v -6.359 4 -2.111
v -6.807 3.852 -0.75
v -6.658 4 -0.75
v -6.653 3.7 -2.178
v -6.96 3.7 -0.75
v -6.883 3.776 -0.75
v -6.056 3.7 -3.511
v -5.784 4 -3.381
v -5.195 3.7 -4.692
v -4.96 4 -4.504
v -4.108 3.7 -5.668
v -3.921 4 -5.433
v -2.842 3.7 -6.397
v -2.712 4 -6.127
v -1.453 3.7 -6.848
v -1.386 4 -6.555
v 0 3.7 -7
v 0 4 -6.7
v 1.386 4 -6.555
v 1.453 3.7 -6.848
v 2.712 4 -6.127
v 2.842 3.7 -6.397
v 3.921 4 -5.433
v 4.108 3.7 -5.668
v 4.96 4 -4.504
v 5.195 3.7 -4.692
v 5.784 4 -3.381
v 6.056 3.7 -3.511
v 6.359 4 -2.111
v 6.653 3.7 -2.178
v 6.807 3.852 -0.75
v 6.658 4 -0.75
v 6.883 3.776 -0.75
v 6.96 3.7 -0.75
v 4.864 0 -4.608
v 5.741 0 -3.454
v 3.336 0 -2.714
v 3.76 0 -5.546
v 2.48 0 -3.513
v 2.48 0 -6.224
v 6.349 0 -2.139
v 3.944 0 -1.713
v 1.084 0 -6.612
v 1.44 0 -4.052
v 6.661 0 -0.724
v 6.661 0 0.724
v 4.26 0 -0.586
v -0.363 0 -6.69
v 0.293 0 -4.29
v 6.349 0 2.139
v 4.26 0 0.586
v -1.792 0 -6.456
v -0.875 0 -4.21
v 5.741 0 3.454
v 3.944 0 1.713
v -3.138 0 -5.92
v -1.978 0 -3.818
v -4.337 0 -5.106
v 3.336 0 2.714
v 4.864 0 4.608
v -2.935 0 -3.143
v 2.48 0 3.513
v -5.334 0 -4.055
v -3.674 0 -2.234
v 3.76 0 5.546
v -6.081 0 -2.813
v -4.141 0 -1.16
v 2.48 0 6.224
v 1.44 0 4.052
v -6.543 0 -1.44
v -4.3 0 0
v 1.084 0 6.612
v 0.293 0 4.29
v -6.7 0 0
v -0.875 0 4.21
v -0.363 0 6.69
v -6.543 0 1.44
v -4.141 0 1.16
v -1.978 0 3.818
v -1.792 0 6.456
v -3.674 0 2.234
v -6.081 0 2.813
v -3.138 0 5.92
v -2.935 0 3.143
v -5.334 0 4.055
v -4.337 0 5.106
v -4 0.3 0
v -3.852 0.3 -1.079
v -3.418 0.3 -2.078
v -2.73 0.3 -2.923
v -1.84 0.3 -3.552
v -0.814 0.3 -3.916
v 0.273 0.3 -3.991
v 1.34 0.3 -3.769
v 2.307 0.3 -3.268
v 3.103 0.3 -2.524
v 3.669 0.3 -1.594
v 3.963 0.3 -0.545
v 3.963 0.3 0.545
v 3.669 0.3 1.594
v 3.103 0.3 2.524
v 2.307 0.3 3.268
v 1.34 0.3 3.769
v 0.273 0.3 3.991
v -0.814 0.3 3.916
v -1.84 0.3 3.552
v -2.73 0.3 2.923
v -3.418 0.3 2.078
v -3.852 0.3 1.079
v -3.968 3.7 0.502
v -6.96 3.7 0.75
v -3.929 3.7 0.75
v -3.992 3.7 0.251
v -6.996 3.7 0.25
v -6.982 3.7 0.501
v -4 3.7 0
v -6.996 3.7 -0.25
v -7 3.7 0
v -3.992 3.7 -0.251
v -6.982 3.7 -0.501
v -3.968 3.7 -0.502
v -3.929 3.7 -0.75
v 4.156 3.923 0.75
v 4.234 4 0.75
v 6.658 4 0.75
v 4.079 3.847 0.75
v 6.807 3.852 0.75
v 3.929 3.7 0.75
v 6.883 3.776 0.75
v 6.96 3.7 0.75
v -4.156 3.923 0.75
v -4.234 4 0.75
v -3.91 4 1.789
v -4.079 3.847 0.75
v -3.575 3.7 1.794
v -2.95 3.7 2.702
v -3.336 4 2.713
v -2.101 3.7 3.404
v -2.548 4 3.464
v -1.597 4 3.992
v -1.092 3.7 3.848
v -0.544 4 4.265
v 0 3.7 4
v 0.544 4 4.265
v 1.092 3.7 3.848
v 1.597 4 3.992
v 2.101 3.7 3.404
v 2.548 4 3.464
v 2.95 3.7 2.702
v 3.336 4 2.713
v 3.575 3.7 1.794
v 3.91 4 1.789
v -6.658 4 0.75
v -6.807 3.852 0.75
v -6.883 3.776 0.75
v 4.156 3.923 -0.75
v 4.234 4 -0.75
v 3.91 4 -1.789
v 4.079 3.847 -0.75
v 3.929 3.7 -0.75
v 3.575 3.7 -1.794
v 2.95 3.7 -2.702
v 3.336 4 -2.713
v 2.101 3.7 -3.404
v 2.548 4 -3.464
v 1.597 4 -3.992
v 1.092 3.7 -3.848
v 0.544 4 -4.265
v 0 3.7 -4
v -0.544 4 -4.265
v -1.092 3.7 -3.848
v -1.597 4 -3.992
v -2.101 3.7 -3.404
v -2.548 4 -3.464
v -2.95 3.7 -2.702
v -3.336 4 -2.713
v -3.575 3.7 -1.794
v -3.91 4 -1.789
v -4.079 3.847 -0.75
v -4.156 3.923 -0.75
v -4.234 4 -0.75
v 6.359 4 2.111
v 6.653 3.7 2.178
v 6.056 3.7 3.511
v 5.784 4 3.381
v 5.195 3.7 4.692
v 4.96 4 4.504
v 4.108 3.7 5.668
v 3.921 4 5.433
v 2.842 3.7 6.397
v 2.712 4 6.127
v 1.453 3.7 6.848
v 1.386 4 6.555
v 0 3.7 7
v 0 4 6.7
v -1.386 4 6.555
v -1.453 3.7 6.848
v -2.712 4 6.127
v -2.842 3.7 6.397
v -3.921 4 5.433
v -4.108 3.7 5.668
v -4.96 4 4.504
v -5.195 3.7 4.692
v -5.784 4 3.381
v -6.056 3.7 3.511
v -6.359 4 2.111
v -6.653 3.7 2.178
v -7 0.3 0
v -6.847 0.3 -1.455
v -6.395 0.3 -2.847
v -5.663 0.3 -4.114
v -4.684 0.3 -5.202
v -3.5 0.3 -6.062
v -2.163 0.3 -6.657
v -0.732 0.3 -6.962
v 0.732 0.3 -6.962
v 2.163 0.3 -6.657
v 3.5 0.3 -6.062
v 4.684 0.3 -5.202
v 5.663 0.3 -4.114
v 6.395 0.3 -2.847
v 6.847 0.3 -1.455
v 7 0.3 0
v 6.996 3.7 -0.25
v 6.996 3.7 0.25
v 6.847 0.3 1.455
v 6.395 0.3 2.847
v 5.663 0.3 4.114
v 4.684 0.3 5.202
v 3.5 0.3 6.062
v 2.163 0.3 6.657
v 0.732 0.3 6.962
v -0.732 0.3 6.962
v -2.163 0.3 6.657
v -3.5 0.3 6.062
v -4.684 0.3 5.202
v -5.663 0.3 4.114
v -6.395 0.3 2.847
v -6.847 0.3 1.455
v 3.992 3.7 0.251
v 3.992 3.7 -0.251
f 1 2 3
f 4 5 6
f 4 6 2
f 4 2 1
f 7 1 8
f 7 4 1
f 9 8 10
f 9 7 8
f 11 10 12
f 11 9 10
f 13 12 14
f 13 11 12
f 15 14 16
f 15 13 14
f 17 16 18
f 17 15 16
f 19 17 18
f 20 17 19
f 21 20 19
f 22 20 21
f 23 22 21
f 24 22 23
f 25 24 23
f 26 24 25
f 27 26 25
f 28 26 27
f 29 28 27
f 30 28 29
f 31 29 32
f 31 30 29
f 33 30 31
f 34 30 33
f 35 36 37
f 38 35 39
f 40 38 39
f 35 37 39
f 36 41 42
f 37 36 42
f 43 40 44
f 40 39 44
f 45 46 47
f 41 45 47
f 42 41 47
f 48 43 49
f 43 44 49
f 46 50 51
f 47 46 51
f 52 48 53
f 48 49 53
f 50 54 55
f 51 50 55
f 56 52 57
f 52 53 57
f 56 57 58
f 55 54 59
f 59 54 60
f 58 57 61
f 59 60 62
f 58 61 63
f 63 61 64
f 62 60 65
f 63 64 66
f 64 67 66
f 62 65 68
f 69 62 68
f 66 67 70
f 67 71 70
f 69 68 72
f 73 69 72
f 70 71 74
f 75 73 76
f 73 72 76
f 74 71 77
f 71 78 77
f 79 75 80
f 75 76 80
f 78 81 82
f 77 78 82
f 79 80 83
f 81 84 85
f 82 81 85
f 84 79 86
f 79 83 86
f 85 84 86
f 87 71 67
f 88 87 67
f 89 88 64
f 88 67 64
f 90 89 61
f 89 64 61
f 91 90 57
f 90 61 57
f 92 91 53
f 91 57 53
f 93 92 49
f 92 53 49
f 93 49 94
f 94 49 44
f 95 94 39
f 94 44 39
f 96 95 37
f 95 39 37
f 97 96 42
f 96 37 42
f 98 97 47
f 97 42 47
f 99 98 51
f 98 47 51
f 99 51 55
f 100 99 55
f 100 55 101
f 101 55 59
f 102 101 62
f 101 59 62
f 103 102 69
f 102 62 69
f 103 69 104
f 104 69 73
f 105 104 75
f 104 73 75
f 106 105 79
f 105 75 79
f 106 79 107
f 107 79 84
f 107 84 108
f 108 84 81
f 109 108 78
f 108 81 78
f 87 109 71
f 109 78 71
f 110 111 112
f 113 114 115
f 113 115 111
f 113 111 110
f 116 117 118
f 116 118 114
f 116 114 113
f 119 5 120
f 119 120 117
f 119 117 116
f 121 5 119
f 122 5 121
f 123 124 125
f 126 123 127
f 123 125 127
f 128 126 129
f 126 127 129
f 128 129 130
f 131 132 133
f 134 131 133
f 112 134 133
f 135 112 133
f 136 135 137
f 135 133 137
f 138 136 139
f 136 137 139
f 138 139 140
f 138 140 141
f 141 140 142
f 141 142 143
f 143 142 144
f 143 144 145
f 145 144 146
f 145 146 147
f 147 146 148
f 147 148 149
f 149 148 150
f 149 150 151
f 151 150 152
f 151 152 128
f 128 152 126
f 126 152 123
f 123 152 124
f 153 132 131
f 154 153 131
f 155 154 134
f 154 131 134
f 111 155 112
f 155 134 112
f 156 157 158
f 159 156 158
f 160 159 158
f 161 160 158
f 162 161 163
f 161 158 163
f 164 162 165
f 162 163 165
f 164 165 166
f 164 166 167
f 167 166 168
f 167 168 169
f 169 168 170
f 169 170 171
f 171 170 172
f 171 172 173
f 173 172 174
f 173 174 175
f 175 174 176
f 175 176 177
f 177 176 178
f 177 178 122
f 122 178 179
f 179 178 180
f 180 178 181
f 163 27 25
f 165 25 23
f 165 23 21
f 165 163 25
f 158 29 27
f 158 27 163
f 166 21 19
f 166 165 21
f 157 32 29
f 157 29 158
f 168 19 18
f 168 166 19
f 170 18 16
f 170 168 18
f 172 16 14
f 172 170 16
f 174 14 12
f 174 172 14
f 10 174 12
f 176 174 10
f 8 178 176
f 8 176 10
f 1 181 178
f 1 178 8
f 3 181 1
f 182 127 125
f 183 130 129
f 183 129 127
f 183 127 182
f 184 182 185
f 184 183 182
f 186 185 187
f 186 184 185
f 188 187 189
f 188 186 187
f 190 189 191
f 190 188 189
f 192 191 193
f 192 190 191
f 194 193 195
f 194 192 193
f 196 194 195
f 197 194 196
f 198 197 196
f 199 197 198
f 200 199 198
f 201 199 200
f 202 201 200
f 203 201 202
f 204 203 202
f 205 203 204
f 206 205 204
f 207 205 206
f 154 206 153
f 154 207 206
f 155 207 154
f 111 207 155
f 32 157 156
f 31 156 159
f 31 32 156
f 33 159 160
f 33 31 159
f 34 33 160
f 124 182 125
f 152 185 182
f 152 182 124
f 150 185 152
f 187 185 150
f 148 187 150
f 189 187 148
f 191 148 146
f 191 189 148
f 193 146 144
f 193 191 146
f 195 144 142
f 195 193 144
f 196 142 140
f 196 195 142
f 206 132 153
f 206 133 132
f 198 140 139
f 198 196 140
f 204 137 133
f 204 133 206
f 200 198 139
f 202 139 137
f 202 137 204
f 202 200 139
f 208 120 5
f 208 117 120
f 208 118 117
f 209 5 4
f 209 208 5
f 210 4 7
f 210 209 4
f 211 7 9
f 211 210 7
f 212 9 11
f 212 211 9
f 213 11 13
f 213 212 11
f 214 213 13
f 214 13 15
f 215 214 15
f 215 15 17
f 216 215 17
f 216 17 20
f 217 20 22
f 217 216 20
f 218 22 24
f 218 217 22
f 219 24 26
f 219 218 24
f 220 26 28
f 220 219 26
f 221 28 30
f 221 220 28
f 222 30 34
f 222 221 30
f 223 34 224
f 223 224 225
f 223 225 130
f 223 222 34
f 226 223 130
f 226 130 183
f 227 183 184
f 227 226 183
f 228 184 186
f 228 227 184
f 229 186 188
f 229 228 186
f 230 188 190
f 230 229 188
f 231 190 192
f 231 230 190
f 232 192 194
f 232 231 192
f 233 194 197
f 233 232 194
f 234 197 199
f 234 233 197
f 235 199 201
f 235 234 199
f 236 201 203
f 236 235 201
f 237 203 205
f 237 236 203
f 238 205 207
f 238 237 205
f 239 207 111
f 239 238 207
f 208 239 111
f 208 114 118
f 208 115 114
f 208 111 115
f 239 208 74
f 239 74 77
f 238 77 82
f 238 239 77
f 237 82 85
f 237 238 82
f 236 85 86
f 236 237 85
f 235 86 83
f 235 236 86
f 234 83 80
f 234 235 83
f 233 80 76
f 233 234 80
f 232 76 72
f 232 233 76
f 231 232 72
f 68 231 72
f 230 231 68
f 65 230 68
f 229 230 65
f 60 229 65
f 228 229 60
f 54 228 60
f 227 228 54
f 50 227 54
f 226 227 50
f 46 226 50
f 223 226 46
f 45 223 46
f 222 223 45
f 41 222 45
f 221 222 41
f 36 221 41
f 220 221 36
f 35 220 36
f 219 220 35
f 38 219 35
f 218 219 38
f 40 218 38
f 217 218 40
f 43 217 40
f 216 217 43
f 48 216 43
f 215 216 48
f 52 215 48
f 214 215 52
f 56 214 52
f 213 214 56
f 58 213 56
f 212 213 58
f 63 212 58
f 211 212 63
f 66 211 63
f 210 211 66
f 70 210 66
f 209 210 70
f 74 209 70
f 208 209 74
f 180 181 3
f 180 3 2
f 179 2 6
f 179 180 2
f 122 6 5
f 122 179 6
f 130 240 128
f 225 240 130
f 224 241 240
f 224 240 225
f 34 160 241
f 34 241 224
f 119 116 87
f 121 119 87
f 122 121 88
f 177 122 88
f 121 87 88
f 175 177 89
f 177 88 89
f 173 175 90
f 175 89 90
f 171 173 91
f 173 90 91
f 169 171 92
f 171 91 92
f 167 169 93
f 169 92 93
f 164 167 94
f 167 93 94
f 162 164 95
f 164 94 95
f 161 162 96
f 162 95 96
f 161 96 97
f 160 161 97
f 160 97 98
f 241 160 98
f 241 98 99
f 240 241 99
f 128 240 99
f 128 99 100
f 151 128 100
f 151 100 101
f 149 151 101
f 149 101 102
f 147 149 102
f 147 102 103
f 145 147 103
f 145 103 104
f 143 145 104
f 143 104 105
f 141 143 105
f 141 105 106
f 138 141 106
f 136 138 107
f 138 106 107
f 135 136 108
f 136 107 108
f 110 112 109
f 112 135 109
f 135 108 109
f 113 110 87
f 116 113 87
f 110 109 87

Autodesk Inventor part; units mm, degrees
ref_plane "YZ Plane" through (0, 0, 0) normal (1, 0, 0) x (0, 1, 0)
ref_plane "XZ Plane" through (0, 0, 0) normal (0, 1, 0) x (-1, 0, 0)
ref_plane "XY Plane" through (0, 0, 0) normal (0, 0, 1) x (1, 0, 0)
sketch "スケッチ1" plane through (0, 0, 0) normal (0, 1, 0) x (-1, 0, 0)
  circle A0 centre (0, 0) radius 7
  circle A1 centre (0, 0) radius 4
  dimension "d0" = 14
  dimension "d1" = 8
extrude "押し出し1" add sketch "スケッチ1" along normal blind 4
sketch "スケッチ2" plane through (0, 4, 0) normal (0, 1, 0) x (1, 0, 0)
  circle A0 centre (0, 0) radius 7 projected
  line L0 (-7, 0) -> (7, 0)
  line L1 (-7, 0.75) -> (7, 0.75)
  line L2 (-7, 0.75) -> (-7, 0)
  line L3 (7, 0.75) -> (7, 0)
  line L4 (-7, -0.75) -> (7, -0.75)
  line L5 (-7, -0.75) -> (-7, 0)
  line L6 (7, -0.75) -> (7, 0)
  point P0 (6.9597, 0.75)
  point P1 (-6.9597, 0.75)
  point P2 (-6.9597, -0.75)
  point P3 (6.9597, -0.75)
  dimension "d4" = 0.75
extrude "押し出し2" cut sketch "スケッチ2" against normal blind 0.3 contours L0 A0 L1 | A0 L4 L0
chamfer "面取り1" distance 0.3 angle 45 6 edges at (0, 4, 4) (0, 4, -4) (0, 4, -7) (0, 4, 7) (7, 0, 0) (4, 0, 0)
properties part number "GSB-081404"
